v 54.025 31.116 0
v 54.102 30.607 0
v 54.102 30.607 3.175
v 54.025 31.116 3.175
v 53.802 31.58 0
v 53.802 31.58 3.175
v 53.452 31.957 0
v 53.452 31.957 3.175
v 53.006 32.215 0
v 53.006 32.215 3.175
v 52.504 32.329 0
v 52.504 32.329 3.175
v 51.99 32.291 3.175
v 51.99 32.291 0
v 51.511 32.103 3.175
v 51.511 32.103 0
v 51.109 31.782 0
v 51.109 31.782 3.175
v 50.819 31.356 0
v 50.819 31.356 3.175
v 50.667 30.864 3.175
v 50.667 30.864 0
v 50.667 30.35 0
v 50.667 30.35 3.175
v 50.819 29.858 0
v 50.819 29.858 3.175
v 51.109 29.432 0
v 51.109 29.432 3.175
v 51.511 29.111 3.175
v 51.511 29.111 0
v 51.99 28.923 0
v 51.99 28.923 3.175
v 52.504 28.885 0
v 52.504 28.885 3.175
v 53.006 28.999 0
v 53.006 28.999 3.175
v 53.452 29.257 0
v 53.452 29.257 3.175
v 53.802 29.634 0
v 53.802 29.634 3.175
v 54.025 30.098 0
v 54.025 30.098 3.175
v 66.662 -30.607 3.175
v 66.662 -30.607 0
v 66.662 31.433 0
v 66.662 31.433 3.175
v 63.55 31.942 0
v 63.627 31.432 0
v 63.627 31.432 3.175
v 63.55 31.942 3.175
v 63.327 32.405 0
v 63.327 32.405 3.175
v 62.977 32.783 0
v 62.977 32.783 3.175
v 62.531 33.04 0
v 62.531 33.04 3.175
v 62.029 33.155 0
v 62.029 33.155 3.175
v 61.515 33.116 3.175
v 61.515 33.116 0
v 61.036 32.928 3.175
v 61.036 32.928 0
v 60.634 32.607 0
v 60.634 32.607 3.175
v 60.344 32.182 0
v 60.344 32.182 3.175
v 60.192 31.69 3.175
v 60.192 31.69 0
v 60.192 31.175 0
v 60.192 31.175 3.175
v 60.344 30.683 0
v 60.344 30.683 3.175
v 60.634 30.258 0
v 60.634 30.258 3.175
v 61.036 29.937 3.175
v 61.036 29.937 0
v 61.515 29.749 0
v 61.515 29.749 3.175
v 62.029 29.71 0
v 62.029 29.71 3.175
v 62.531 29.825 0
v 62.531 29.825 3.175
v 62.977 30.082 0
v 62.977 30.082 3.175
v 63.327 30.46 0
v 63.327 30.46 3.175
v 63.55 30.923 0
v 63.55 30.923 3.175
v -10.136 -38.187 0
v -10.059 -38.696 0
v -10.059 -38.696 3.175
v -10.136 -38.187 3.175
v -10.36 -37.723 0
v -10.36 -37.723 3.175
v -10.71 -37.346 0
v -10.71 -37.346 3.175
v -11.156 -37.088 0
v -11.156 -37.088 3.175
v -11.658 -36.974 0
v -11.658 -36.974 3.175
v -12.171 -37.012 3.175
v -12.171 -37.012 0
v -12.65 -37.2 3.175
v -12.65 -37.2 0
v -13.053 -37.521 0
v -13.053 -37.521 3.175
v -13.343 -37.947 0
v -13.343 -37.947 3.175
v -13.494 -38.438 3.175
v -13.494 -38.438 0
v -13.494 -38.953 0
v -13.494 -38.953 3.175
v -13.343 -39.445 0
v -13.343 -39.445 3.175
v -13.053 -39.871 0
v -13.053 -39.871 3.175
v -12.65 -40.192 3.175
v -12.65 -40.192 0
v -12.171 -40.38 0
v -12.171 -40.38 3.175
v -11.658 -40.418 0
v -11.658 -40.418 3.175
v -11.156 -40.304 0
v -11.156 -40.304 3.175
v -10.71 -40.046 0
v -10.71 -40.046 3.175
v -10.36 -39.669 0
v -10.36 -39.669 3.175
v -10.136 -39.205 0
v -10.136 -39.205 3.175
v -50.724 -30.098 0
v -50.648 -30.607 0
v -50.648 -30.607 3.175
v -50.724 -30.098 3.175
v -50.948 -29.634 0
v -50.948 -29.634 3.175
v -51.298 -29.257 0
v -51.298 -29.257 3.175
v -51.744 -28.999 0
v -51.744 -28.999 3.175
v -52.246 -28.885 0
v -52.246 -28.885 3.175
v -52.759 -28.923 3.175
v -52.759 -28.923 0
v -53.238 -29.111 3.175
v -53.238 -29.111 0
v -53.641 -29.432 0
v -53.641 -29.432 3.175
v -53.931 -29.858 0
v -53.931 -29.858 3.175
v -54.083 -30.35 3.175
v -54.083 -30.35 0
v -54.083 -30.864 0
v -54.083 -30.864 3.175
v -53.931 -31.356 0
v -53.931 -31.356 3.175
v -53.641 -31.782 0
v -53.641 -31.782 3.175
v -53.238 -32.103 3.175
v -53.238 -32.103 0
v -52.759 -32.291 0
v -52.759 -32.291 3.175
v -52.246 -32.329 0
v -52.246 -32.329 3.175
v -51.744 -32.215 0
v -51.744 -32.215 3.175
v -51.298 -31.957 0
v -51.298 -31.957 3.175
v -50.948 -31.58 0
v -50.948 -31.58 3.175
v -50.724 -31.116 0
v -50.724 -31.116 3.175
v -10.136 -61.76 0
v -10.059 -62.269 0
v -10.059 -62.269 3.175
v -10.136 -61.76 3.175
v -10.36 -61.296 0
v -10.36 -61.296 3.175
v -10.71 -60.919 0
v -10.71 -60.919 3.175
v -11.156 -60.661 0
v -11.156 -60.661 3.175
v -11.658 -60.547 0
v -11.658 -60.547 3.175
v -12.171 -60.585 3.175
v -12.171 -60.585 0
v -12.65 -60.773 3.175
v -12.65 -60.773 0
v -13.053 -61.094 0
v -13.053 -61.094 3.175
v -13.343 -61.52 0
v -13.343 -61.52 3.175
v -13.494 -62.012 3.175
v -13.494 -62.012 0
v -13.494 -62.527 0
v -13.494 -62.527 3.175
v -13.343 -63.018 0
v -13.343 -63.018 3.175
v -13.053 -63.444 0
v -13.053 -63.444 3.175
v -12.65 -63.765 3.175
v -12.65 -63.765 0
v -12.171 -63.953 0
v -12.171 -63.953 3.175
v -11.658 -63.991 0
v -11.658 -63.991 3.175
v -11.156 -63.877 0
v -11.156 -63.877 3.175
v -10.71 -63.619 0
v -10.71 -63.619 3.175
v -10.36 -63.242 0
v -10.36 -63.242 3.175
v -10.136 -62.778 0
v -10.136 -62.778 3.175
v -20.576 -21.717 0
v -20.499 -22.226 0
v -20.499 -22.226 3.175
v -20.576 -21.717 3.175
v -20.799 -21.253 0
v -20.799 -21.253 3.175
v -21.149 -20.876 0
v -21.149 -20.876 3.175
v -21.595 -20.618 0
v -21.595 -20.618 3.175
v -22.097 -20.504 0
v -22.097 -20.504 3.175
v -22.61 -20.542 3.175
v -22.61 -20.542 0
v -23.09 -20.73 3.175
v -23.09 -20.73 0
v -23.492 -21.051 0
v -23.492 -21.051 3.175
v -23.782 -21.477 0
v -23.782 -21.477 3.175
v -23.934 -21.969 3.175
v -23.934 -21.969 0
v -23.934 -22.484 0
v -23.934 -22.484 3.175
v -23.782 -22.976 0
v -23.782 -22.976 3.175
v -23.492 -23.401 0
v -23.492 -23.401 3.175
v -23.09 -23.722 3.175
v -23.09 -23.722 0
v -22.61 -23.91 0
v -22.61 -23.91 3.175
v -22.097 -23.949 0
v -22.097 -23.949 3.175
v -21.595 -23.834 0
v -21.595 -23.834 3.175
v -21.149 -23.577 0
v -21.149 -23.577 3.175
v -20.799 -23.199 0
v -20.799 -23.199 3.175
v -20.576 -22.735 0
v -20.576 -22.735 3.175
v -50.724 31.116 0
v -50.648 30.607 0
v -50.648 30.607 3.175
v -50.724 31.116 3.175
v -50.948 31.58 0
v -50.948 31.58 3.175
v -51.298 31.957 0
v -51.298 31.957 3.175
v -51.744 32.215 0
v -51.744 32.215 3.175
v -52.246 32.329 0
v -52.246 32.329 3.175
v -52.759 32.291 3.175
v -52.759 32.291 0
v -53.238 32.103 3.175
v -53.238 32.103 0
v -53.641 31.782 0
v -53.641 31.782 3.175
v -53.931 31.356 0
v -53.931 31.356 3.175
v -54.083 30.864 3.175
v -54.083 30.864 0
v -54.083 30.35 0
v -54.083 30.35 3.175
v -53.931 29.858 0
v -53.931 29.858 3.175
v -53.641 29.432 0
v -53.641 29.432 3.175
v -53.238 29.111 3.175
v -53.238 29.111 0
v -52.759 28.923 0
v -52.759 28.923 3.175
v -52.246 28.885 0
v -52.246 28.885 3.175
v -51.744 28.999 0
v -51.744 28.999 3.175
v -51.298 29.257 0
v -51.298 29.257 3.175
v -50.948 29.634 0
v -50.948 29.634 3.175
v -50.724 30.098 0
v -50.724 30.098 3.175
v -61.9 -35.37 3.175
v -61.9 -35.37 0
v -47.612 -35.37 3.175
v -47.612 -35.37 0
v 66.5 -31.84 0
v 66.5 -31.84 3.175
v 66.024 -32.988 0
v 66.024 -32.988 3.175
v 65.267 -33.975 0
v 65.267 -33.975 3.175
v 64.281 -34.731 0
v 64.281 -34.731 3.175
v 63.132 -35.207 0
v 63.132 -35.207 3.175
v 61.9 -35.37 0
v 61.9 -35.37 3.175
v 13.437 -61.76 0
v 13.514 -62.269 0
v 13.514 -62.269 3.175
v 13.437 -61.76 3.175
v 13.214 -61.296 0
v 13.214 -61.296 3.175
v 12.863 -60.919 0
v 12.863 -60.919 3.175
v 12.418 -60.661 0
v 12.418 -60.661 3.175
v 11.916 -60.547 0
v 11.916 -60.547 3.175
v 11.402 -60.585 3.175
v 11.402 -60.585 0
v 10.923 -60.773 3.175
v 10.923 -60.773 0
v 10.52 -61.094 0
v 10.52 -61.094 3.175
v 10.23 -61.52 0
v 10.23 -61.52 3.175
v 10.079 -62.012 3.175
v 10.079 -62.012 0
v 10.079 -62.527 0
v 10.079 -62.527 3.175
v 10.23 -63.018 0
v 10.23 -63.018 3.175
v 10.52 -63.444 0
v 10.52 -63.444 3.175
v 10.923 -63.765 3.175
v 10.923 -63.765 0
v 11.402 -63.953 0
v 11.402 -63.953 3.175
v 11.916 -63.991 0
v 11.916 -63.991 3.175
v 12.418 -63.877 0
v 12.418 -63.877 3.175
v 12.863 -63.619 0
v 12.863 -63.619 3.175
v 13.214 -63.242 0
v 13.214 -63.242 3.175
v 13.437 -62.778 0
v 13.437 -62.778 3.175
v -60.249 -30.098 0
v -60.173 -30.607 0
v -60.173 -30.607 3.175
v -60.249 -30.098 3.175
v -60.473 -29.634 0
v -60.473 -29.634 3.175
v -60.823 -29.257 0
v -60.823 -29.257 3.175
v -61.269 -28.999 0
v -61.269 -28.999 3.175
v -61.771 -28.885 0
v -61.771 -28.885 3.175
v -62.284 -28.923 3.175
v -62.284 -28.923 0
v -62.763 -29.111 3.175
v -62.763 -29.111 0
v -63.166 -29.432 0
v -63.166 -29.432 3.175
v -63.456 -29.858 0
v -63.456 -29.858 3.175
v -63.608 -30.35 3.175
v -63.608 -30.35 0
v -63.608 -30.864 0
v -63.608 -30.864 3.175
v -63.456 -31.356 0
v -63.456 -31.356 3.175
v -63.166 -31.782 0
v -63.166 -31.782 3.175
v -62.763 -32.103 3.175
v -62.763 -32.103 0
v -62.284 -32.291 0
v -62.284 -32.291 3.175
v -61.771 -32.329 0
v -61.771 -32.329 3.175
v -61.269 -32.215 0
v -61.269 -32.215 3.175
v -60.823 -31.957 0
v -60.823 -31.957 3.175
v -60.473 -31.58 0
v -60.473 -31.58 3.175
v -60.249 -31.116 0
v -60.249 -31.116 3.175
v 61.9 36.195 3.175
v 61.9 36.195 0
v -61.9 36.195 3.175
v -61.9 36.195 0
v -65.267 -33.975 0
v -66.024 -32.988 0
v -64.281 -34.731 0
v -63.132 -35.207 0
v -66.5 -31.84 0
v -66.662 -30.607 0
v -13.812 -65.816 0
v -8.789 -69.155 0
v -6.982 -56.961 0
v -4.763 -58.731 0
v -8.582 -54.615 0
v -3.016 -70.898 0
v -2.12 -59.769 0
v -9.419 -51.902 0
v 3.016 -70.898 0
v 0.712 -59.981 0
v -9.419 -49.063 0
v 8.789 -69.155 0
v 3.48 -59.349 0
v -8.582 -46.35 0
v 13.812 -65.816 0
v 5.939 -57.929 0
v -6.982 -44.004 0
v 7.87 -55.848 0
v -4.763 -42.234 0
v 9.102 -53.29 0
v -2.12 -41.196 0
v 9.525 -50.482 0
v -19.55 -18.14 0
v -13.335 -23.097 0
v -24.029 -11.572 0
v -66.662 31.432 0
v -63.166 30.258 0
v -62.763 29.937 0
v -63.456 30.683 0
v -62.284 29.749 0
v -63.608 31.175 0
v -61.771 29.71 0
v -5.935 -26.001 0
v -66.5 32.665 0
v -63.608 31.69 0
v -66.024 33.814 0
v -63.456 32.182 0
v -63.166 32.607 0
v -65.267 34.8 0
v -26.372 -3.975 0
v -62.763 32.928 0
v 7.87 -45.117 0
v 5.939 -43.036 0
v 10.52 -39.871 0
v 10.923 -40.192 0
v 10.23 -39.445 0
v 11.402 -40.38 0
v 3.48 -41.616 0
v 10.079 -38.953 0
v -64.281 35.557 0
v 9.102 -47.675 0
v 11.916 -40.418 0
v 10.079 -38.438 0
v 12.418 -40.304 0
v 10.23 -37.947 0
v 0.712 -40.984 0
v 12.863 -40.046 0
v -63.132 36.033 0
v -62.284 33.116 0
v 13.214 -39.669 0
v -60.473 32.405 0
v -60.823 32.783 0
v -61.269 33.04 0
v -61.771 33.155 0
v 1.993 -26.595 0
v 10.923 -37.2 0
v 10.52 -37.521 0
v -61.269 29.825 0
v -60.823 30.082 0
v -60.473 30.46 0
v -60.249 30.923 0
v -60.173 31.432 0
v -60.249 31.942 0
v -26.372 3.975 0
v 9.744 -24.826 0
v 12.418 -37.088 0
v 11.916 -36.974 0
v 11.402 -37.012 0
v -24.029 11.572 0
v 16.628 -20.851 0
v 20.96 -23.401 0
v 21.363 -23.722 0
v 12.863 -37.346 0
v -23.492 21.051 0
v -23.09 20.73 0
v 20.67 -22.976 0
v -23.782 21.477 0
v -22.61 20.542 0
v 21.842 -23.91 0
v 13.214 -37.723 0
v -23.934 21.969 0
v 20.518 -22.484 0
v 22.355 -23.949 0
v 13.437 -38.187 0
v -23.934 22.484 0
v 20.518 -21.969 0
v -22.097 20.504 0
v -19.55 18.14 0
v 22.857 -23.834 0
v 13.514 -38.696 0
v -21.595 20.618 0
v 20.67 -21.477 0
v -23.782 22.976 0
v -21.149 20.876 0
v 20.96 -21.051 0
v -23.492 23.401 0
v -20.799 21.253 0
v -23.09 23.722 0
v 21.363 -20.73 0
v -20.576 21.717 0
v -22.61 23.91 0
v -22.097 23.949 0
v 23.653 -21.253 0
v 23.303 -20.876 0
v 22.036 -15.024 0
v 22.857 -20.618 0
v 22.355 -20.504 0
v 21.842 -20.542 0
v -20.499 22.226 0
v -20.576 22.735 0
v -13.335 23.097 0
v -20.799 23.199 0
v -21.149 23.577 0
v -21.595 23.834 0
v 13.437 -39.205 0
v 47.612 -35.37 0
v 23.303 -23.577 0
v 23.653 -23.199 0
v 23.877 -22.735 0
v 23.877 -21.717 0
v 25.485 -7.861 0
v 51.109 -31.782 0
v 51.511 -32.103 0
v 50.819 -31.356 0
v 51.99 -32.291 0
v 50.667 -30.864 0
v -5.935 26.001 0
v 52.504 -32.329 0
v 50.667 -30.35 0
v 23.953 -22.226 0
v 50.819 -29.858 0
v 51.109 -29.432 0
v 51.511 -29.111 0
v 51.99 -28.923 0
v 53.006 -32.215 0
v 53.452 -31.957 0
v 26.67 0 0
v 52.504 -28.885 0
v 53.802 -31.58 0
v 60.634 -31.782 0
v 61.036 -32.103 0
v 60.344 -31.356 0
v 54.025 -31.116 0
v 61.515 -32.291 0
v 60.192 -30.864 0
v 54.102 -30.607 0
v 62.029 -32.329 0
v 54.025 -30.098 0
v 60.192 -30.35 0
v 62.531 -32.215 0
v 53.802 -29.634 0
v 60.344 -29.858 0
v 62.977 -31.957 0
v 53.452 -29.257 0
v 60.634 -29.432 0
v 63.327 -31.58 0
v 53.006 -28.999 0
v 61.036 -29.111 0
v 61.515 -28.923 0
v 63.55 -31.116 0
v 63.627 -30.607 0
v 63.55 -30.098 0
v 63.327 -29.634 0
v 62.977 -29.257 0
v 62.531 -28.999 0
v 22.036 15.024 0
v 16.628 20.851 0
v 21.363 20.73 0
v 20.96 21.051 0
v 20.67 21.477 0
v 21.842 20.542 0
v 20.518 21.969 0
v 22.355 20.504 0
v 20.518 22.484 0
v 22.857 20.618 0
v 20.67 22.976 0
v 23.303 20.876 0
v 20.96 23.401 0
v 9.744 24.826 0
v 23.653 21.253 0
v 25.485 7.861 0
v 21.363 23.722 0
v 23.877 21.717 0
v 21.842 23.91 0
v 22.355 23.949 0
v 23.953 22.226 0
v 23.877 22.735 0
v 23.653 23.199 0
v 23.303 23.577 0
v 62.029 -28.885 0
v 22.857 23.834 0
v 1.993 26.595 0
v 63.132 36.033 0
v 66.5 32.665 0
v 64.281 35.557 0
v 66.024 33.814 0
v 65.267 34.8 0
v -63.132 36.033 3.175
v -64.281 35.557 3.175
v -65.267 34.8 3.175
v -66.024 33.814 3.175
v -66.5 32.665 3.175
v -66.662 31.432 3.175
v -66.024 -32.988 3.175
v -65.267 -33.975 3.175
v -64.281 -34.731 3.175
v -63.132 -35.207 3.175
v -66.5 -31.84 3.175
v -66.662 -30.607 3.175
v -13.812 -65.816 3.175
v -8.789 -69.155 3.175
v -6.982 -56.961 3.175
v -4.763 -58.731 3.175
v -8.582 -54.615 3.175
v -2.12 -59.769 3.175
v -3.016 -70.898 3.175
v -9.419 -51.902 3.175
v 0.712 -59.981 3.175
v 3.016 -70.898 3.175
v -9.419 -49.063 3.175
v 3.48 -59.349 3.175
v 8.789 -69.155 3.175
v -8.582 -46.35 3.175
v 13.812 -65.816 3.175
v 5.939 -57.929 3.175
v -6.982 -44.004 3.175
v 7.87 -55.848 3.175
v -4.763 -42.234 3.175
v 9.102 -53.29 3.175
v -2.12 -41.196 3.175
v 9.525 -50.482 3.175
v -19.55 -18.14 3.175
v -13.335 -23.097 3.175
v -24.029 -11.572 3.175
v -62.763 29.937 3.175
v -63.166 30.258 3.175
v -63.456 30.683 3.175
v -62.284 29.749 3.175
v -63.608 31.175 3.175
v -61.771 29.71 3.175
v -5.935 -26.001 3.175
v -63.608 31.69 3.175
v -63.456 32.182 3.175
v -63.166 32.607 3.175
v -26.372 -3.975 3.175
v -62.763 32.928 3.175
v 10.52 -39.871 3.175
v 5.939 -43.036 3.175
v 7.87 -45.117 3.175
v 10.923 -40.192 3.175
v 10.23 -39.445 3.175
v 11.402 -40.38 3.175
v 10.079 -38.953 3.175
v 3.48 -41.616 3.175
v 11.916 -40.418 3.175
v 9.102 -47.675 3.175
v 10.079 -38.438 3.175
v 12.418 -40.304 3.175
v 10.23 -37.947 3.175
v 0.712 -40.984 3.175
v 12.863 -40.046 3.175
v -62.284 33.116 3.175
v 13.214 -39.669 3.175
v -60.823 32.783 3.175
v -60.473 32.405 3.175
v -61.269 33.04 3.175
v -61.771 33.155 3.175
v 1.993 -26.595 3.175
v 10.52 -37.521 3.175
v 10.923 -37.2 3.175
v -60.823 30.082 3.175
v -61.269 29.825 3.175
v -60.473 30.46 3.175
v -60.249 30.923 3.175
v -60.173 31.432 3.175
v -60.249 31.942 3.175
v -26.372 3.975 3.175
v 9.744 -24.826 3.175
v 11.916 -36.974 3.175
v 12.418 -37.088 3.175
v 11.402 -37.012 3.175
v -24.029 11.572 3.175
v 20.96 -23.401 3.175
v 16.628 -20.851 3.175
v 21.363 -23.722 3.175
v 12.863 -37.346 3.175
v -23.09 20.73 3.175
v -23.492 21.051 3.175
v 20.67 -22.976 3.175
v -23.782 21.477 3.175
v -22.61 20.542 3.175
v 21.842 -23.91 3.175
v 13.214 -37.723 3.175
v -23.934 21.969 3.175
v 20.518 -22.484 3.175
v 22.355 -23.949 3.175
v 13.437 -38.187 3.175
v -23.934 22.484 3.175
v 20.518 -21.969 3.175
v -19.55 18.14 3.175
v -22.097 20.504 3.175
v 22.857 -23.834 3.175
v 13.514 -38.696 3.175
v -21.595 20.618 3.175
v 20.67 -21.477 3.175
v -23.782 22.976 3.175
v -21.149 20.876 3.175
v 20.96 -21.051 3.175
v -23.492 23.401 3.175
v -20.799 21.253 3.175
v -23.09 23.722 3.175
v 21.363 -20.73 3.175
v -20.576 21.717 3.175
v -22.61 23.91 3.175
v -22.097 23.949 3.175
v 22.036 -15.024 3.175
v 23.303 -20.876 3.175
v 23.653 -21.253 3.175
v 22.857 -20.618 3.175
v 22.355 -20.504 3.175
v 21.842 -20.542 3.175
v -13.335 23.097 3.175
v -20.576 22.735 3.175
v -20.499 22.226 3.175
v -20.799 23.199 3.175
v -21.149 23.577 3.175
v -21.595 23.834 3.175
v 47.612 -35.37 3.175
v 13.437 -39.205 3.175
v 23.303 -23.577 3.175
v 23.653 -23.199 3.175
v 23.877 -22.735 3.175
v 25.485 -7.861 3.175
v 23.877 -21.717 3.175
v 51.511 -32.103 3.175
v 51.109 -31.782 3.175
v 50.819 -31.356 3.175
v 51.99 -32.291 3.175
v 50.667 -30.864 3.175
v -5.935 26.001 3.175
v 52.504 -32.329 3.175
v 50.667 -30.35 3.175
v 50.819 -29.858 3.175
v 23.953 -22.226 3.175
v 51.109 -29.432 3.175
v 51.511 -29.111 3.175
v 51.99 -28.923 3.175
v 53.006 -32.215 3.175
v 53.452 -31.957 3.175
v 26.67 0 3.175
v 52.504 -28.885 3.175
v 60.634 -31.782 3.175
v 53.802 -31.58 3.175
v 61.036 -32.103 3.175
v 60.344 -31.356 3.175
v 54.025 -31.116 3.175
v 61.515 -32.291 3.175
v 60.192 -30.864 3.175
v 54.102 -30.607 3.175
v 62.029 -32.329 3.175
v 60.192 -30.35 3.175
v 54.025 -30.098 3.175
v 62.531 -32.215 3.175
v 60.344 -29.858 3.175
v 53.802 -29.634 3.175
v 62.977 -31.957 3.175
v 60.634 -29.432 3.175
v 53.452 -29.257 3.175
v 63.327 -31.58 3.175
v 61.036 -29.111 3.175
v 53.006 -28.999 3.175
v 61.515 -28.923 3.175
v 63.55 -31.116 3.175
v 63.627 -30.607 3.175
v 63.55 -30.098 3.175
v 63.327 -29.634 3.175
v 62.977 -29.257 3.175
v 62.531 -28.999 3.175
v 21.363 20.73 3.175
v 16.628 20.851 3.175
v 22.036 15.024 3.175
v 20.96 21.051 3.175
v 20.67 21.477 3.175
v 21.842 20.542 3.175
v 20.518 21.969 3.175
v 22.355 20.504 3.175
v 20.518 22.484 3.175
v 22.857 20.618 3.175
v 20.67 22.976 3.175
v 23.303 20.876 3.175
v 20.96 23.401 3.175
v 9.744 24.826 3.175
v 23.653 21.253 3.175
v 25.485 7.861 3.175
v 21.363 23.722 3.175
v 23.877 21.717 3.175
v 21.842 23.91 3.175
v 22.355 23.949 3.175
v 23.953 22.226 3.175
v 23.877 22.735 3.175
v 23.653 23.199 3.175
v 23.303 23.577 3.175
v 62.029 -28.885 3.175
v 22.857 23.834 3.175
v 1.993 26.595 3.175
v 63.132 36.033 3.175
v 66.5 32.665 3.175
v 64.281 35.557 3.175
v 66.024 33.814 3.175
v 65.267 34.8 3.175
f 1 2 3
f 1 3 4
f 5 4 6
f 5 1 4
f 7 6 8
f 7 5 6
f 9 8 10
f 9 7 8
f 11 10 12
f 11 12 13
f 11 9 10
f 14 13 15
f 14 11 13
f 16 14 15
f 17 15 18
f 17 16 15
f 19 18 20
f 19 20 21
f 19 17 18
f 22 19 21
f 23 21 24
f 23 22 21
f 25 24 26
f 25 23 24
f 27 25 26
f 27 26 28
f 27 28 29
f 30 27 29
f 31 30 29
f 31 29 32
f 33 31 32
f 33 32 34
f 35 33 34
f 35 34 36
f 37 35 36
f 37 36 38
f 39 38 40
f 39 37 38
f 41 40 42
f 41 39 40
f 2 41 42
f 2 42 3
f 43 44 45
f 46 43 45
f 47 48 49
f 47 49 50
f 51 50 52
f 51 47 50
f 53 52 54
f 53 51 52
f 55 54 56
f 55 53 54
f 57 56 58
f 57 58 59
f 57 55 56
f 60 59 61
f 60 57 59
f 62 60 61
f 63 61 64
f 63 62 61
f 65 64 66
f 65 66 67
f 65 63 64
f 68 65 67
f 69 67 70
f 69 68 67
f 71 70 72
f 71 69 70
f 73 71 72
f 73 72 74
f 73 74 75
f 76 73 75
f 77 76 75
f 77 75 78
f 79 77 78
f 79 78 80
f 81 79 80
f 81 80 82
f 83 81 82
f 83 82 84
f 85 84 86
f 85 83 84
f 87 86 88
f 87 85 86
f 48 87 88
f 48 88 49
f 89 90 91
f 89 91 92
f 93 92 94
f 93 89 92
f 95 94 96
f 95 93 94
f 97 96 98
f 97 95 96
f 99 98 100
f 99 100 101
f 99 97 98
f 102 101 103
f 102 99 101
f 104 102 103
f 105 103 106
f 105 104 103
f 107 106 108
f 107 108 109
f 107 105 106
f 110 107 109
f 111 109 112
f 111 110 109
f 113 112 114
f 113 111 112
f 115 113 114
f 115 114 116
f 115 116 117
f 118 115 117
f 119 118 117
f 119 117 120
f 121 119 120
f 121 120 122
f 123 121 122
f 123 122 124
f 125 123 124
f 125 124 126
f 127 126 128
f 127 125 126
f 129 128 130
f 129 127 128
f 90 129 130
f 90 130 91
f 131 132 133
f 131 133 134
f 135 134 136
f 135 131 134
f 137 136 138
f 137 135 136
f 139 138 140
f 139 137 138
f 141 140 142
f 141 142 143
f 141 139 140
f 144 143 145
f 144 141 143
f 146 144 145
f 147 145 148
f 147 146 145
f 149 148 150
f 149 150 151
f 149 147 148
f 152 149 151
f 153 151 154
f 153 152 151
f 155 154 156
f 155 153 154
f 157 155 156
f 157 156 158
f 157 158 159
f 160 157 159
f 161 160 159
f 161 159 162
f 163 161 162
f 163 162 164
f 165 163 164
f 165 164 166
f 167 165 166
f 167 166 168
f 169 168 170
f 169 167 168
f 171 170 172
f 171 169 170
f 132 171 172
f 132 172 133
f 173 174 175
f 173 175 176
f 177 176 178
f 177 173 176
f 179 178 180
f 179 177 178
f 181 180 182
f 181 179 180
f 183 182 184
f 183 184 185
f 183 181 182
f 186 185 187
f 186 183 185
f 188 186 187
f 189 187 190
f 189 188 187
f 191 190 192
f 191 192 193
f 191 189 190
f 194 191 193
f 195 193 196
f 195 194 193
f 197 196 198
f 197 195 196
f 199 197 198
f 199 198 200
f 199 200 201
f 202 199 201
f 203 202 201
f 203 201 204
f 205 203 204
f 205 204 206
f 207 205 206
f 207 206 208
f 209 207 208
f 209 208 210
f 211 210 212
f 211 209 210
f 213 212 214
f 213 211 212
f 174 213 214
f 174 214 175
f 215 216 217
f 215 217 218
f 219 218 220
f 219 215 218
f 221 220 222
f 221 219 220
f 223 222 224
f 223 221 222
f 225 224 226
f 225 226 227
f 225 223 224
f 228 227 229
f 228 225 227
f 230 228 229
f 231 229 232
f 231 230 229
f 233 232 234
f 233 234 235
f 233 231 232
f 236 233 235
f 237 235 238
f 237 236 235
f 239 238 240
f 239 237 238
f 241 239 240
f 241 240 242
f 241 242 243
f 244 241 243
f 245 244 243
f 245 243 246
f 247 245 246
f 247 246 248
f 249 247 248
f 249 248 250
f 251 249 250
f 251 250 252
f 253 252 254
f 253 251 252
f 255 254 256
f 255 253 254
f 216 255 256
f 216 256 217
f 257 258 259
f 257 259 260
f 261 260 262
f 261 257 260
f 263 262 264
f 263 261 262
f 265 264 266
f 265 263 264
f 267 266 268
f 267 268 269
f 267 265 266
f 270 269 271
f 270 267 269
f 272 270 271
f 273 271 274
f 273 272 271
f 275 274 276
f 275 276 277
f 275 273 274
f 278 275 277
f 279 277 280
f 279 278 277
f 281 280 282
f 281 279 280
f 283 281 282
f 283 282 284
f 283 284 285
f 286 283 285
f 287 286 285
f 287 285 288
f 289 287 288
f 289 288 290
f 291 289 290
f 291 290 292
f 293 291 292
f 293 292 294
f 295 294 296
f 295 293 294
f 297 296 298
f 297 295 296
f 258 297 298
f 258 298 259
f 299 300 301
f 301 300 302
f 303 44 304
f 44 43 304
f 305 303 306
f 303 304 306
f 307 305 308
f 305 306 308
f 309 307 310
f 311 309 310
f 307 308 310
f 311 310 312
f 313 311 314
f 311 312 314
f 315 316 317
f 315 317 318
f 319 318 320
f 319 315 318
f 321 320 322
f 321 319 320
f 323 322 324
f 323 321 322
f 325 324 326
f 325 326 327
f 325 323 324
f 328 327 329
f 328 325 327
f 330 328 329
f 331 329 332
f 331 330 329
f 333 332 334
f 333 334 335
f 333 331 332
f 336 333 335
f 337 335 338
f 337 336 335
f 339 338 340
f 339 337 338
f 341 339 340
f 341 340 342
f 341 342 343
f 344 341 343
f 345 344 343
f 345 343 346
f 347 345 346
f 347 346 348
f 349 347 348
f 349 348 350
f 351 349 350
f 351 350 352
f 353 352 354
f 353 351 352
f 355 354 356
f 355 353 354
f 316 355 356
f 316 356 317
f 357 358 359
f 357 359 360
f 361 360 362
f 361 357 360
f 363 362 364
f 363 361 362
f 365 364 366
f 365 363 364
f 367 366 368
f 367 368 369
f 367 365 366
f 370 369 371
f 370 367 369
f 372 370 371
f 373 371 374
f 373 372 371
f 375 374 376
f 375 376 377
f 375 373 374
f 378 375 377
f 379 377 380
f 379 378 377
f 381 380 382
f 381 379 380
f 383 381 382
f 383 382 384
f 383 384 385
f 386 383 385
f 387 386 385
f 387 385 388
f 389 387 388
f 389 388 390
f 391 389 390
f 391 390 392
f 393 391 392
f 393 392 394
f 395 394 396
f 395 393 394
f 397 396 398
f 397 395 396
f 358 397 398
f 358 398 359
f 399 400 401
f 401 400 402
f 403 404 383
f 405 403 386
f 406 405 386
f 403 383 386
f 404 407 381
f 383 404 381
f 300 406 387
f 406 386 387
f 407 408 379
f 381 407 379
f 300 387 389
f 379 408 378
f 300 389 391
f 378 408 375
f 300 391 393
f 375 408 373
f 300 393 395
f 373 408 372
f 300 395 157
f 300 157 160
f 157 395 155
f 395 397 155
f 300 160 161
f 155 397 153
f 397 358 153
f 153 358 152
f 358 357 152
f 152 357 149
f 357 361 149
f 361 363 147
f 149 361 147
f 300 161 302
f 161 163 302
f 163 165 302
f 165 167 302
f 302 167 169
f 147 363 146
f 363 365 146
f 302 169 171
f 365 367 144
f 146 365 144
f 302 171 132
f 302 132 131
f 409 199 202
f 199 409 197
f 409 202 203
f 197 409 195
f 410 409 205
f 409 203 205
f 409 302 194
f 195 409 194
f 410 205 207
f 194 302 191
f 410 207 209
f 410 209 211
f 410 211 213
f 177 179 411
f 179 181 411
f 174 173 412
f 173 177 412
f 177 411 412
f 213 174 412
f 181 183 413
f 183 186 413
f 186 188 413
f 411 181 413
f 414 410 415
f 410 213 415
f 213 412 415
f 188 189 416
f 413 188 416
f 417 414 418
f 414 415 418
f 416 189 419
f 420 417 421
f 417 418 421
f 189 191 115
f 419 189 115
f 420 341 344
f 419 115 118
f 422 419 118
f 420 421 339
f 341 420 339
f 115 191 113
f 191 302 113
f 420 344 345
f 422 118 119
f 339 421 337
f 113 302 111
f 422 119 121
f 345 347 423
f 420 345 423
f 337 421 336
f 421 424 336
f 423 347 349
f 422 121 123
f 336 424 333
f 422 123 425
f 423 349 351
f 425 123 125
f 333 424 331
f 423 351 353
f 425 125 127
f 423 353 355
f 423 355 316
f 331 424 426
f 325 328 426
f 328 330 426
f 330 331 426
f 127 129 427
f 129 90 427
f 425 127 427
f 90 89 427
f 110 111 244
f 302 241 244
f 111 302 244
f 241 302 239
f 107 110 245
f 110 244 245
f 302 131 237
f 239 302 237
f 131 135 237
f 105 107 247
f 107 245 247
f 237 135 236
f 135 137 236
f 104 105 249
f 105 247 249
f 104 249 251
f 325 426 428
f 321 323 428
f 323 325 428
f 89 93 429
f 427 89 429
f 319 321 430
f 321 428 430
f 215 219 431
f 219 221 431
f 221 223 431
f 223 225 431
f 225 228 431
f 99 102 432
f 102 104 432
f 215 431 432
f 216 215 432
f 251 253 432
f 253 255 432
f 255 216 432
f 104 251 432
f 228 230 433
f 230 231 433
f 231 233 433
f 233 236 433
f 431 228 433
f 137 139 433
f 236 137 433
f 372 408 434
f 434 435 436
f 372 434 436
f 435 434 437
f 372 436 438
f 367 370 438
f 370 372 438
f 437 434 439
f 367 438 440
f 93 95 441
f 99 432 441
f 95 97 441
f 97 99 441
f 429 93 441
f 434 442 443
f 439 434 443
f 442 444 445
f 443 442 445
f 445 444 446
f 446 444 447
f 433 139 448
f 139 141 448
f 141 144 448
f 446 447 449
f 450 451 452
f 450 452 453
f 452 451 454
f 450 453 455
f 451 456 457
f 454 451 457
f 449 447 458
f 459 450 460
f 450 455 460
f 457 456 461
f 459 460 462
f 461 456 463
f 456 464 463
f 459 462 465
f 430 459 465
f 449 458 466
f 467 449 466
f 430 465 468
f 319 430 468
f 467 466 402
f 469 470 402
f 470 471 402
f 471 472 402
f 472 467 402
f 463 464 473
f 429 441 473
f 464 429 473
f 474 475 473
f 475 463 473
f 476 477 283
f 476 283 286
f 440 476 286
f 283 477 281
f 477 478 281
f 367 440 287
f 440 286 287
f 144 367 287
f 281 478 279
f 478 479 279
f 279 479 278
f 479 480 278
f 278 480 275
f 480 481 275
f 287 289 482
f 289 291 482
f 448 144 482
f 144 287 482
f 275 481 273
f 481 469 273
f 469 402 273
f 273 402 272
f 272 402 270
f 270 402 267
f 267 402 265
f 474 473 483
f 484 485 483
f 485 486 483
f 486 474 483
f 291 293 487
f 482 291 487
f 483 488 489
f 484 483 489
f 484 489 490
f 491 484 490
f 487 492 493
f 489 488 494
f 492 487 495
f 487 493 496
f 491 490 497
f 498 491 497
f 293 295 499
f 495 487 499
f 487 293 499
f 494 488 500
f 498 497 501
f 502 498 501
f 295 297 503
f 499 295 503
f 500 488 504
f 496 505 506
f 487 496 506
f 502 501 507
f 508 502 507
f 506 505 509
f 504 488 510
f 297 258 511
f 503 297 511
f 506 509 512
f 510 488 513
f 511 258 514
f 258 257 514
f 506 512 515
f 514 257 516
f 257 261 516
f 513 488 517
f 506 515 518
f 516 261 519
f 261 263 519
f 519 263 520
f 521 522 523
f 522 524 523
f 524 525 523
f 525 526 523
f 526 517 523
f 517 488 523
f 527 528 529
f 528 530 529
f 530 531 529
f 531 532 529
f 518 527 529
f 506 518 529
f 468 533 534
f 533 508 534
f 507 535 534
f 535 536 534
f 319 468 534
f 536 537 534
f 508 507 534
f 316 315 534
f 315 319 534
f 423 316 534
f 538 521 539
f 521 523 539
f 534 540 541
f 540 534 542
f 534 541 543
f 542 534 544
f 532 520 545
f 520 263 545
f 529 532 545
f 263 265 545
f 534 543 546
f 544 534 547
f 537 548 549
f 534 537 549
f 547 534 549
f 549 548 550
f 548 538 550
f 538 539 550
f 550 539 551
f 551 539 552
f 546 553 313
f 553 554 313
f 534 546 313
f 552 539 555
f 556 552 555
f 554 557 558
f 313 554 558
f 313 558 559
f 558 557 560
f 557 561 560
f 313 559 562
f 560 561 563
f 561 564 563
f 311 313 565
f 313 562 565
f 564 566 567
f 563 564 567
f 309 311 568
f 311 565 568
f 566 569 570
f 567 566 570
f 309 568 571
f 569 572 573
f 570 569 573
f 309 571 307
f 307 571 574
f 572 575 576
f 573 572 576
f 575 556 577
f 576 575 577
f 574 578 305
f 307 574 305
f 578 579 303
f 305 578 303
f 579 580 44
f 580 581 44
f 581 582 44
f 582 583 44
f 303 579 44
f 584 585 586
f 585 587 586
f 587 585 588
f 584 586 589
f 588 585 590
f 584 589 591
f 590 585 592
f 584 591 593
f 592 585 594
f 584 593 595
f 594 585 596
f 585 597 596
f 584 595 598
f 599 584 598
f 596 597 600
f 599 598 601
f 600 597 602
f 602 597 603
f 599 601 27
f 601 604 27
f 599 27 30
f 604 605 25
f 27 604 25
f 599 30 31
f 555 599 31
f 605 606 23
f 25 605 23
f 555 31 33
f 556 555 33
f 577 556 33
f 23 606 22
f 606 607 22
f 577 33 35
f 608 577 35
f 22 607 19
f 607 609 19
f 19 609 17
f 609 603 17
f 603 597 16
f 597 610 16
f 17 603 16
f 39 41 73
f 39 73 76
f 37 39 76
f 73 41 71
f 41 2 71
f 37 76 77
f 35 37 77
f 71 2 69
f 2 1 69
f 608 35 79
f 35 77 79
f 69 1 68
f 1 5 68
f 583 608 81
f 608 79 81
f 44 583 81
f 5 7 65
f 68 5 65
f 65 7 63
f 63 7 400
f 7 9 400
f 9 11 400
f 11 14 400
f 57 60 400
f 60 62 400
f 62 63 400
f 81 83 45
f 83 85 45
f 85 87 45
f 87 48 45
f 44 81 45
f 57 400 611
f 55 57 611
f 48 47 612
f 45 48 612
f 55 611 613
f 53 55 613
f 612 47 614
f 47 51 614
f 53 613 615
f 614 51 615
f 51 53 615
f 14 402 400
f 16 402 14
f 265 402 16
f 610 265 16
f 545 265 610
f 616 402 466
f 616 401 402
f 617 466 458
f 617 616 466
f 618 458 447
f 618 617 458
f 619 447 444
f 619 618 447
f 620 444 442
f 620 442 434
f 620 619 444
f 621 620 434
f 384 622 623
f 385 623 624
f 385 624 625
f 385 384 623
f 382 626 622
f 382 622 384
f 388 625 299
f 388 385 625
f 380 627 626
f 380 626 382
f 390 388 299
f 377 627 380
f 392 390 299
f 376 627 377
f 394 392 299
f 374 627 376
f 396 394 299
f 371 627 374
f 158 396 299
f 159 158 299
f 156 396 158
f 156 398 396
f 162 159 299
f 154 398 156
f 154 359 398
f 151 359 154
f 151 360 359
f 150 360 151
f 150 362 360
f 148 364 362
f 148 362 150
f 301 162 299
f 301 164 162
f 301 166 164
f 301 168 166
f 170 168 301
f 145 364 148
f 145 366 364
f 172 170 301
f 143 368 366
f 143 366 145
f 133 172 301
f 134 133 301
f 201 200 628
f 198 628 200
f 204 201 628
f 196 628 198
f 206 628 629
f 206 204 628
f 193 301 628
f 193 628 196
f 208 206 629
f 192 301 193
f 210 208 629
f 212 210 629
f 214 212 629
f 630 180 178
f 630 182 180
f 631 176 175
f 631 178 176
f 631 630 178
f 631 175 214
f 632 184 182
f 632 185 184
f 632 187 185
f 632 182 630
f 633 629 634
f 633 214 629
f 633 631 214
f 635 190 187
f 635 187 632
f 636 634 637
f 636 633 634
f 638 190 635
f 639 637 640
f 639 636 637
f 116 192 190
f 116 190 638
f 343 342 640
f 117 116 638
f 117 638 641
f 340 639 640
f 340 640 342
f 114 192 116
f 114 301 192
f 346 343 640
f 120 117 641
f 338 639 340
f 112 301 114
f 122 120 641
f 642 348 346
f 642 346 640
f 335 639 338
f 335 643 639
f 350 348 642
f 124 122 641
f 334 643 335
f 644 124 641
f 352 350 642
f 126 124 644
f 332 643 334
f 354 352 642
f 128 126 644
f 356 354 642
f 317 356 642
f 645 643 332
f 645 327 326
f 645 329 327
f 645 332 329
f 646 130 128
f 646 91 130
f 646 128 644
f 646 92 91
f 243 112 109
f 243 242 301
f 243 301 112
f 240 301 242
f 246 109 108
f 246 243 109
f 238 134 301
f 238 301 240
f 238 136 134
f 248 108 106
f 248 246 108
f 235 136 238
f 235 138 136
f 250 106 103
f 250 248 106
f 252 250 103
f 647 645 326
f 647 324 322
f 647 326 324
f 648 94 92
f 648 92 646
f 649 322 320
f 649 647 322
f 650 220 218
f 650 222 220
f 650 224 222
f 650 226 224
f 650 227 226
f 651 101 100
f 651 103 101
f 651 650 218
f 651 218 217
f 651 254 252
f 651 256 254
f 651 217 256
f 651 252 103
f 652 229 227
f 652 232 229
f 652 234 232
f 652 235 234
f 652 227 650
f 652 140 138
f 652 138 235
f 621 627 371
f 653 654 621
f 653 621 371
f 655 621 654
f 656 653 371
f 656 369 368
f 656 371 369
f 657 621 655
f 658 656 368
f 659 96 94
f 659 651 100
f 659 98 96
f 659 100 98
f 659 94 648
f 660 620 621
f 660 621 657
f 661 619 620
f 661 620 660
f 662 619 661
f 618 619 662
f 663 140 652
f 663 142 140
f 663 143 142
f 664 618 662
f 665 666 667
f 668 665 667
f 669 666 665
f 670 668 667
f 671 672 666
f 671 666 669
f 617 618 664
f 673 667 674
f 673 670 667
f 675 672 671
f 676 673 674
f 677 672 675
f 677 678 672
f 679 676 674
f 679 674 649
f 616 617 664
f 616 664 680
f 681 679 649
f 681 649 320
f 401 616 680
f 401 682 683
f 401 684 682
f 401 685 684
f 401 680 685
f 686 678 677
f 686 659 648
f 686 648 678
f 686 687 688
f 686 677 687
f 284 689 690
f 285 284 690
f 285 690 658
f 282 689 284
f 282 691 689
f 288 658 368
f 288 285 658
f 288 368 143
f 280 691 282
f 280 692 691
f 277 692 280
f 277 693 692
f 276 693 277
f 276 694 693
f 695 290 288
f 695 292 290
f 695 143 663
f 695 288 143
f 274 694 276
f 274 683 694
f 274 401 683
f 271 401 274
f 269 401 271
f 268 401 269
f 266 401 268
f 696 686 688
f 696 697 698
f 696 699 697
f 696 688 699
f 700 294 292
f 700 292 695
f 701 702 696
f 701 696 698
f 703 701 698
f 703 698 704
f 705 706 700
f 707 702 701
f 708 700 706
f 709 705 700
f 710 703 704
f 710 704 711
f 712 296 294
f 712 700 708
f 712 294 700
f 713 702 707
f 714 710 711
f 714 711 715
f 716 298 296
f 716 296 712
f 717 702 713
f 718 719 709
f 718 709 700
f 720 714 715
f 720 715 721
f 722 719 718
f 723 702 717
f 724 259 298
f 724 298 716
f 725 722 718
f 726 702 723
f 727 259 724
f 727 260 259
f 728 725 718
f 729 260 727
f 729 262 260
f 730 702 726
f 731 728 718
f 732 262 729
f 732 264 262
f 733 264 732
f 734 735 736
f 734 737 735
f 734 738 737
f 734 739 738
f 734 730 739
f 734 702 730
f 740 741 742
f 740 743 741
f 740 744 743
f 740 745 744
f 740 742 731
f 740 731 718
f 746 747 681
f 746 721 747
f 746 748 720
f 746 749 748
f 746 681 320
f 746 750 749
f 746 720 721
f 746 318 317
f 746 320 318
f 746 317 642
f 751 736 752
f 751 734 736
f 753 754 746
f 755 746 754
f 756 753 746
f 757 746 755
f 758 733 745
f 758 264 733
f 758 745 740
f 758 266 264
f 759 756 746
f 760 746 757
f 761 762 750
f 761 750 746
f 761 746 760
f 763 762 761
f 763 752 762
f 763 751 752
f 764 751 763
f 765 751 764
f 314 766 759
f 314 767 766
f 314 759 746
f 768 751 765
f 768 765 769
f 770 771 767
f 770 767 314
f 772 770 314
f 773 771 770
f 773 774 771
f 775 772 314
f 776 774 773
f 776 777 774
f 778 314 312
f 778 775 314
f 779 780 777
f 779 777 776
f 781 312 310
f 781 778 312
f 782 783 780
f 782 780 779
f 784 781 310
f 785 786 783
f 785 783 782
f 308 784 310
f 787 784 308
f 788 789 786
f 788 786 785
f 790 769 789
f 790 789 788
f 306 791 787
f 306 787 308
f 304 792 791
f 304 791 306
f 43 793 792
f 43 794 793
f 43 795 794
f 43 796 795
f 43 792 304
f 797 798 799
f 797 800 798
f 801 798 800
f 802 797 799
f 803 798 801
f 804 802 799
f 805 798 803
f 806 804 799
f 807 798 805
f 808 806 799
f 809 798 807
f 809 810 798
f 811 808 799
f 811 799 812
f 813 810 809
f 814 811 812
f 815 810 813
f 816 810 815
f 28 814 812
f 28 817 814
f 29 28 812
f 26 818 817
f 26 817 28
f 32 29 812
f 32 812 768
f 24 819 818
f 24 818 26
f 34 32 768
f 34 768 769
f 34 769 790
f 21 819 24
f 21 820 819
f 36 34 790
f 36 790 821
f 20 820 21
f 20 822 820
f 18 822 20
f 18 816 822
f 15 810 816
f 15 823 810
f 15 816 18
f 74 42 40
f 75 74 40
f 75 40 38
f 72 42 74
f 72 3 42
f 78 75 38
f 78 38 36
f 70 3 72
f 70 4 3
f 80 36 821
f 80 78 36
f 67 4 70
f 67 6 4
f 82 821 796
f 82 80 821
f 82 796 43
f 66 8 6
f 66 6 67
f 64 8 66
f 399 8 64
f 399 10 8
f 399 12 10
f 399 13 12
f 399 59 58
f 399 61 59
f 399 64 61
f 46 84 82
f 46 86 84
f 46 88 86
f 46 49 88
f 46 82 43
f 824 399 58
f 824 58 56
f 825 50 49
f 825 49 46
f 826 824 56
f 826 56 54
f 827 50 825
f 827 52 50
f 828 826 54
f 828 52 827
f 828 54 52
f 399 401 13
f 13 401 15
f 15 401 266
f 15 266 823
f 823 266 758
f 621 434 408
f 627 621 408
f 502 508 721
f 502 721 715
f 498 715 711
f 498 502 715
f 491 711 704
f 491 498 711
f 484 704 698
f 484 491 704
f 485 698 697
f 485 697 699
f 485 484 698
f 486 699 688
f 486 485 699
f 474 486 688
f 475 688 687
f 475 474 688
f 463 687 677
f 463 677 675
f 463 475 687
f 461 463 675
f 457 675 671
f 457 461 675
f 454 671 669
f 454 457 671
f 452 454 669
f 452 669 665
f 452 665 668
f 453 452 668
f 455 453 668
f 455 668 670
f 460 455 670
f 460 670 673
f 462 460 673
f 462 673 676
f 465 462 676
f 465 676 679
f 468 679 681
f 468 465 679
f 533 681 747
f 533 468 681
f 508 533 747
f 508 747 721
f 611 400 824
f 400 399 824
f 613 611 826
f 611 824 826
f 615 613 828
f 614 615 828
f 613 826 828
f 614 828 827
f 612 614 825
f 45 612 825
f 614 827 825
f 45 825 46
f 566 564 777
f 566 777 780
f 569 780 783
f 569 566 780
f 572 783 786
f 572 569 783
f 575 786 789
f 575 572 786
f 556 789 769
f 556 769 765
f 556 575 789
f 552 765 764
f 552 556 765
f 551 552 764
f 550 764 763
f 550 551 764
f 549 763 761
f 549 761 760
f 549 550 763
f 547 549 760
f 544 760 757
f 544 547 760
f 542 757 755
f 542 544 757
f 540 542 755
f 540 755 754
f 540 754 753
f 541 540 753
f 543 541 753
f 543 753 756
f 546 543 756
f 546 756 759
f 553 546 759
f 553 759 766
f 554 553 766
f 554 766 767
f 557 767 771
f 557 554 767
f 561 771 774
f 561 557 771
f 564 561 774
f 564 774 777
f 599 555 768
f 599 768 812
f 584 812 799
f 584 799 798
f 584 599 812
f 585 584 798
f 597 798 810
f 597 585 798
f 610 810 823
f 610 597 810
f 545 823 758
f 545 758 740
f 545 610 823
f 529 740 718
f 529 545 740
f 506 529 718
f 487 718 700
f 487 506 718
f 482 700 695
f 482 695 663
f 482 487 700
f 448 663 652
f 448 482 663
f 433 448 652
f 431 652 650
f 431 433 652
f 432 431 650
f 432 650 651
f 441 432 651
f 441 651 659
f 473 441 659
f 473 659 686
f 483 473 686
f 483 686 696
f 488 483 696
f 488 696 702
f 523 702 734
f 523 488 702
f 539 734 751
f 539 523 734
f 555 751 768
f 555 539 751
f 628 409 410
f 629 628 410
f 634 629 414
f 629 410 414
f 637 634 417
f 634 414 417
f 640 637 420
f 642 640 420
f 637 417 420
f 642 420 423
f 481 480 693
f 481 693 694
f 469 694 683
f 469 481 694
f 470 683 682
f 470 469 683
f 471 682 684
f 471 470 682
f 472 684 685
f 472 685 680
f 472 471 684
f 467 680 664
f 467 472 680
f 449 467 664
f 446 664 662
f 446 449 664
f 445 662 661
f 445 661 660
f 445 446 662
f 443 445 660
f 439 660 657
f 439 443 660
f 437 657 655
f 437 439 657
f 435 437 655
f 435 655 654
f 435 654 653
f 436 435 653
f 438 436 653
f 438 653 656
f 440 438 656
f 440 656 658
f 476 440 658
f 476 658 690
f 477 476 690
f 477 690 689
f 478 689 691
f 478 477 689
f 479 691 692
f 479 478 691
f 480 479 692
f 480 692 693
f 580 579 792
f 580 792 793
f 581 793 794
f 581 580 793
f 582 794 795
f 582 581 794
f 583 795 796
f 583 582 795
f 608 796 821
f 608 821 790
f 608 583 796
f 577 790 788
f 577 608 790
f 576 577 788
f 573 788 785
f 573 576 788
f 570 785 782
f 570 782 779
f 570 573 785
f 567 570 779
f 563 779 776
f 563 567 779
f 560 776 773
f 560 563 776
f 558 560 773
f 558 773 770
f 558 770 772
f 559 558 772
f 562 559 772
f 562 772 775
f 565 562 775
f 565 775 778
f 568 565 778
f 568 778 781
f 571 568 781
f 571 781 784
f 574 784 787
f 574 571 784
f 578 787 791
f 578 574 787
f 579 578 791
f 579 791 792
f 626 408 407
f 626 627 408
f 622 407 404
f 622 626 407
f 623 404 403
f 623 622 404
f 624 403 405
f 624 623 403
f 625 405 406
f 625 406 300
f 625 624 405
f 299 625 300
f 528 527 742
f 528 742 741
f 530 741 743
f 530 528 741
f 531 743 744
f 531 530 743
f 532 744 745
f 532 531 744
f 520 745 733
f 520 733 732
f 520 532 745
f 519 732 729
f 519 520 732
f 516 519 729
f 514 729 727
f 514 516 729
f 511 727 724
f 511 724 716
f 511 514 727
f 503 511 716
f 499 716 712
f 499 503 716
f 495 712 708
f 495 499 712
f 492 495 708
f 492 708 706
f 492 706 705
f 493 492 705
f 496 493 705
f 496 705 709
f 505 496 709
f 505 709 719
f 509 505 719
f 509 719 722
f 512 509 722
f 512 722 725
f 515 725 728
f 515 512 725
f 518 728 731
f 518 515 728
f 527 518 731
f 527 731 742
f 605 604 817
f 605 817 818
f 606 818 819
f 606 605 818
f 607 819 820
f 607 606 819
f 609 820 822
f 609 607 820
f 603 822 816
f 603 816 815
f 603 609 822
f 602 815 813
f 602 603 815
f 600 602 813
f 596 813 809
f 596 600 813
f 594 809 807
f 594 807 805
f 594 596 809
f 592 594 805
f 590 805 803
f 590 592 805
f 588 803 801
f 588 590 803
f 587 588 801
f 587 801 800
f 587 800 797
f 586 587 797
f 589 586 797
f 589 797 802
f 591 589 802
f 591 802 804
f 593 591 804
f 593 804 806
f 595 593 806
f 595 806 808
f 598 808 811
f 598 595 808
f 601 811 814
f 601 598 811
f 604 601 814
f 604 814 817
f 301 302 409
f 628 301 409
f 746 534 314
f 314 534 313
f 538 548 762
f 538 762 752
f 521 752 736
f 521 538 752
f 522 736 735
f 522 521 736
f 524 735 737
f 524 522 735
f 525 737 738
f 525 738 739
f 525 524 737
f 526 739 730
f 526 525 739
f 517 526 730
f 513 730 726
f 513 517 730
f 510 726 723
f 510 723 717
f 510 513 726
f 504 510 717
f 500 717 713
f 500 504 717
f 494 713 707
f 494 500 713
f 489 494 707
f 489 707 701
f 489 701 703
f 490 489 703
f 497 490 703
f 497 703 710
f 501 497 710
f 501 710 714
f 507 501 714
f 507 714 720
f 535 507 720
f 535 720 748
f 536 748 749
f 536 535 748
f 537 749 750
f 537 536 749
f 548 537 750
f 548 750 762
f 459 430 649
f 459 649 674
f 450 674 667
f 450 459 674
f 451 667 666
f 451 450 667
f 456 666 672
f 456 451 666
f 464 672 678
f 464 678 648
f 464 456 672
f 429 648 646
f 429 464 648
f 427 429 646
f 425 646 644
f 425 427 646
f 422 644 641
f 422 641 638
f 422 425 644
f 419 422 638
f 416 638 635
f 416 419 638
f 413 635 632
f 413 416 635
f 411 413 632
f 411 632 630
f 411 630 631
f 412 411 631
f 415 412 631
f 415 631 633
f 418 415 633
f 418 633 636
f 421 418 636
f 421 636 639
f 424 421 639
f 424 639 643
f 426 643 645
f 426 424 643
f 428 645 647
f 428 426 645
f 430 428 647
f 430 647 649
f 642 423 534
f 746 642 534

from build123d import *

# Parameters (mm, degrees)
F0_R     = 1.7272
F0_R_2   = 9.525
F0_R_3   = 26.67
F1_DEPTH = 3.175
F2_R     = 4.7625


with BuildPart() as f1:
    # F0 (on Top) → F1 (new body)
    with BuildSketch(Plane.XY):
        with BuildLine():
            Line((66.6623, 36.195), (-66.6623, 36.195))
            Line((-66.6623, 36.195), (-66.6623, -35.3695))
            Line((-66.6623, -35.3695), (-47.6123, -35.3695))
            Line((-47.6123, -35.3695), (-13.812487, -65.816176))
            ThreePointArc((-13.812487, -65.816176), (0, -71.12), (13.812487, -65.816176))
            Line((13.812487, -65.816176), (47.6123, -35.3695))
            Line((47.6123, -35.3695), (66.6623, -35.3695))
            Line((66.6623, -35.3695), (66.6623, 36.195))
        make_face()
        with Locations((-11.786586, -62.269086)):
            Circle(F0_R, mode=Mode.SUBTRACT)
        with Locations((-61.8998, -30.607)):
            Circle(F0_R, mode=Mode.SUBTRACT)
        with Locations((-52.3748, -30.607)):
            Circle(F0_R, mode=Mode.SUBTRACT)
        with Locations((-11.786586, -38.695914)):
            Circle(F0_R, mode=Mode.SUBTRACT)
        with Locations((-22.226134, -22.226134)):
            Circle(F0_R, mode=Mode.SUBTRACT)
        with Locations((11.786586, -62.269086)):
            Circle(F0_R, mode=Mode.SUBTRACT)
        with Locations((0, -50.4825)):
            Circle(F0_R_2, mode=Mode.SUBTRACT)
        with Locations((11.786586, -38.695914)):
            Circle(F0_R, mode=Mode.SUBTRACT)
        with Locations((22.226134, -22.226134)):
            Circle(F0_R, mode=Mode.SUBTRACT)
        with Locations((52.3748, -30.607)):
            Circle(F0_R, mode=Mode.SUBTRACT)
        with Locations((61.8998, -30.607)):
            Circle(F0_R, mode=Mode.SUBTRACT)
        with Locations((-61.8998, 31.4325)):
            Circle(F0_R, mode=Mode.SUBTRACT)
        with Locations((-52.3748, 30.607)):
            Circle(F0_R, mode=Mode.SUBTRACT)
        with Locations((-22.226134, 22.226134)):
            Circle(F0_R, mode=Mode.SUBTRACT)
        Circle(F0_R_3, mode=Mode.SUBTRACT)
        with Locations((22.226134, 22.226134)):
            Circle(F0_R, mode=Mode.SUBTRACT)
        with Locations((52.3748, 30.607)):
            Circle(F0_R, mode=Mode.SUBTRACT)
        with Locations((61.8998, 31.4325)):
            Circle(F0_R, mode=Mode.SUBTRACT)
    extrude(amount=F1_DEPTH)

    # F2
    f2_edges = [f1.edges().sort_by_distance(p)[0] for p in [
        (-66.6623, 36.195, 1.5875),
        (66.6623, 36.195, 1.5875),
        (66.6623, -35.3695, 1.5875),
        (-66.6623, -35.3695, 1.5875),
    ]]
    fillet(f2_edges, radius=F2_R)


solid = f1.part
